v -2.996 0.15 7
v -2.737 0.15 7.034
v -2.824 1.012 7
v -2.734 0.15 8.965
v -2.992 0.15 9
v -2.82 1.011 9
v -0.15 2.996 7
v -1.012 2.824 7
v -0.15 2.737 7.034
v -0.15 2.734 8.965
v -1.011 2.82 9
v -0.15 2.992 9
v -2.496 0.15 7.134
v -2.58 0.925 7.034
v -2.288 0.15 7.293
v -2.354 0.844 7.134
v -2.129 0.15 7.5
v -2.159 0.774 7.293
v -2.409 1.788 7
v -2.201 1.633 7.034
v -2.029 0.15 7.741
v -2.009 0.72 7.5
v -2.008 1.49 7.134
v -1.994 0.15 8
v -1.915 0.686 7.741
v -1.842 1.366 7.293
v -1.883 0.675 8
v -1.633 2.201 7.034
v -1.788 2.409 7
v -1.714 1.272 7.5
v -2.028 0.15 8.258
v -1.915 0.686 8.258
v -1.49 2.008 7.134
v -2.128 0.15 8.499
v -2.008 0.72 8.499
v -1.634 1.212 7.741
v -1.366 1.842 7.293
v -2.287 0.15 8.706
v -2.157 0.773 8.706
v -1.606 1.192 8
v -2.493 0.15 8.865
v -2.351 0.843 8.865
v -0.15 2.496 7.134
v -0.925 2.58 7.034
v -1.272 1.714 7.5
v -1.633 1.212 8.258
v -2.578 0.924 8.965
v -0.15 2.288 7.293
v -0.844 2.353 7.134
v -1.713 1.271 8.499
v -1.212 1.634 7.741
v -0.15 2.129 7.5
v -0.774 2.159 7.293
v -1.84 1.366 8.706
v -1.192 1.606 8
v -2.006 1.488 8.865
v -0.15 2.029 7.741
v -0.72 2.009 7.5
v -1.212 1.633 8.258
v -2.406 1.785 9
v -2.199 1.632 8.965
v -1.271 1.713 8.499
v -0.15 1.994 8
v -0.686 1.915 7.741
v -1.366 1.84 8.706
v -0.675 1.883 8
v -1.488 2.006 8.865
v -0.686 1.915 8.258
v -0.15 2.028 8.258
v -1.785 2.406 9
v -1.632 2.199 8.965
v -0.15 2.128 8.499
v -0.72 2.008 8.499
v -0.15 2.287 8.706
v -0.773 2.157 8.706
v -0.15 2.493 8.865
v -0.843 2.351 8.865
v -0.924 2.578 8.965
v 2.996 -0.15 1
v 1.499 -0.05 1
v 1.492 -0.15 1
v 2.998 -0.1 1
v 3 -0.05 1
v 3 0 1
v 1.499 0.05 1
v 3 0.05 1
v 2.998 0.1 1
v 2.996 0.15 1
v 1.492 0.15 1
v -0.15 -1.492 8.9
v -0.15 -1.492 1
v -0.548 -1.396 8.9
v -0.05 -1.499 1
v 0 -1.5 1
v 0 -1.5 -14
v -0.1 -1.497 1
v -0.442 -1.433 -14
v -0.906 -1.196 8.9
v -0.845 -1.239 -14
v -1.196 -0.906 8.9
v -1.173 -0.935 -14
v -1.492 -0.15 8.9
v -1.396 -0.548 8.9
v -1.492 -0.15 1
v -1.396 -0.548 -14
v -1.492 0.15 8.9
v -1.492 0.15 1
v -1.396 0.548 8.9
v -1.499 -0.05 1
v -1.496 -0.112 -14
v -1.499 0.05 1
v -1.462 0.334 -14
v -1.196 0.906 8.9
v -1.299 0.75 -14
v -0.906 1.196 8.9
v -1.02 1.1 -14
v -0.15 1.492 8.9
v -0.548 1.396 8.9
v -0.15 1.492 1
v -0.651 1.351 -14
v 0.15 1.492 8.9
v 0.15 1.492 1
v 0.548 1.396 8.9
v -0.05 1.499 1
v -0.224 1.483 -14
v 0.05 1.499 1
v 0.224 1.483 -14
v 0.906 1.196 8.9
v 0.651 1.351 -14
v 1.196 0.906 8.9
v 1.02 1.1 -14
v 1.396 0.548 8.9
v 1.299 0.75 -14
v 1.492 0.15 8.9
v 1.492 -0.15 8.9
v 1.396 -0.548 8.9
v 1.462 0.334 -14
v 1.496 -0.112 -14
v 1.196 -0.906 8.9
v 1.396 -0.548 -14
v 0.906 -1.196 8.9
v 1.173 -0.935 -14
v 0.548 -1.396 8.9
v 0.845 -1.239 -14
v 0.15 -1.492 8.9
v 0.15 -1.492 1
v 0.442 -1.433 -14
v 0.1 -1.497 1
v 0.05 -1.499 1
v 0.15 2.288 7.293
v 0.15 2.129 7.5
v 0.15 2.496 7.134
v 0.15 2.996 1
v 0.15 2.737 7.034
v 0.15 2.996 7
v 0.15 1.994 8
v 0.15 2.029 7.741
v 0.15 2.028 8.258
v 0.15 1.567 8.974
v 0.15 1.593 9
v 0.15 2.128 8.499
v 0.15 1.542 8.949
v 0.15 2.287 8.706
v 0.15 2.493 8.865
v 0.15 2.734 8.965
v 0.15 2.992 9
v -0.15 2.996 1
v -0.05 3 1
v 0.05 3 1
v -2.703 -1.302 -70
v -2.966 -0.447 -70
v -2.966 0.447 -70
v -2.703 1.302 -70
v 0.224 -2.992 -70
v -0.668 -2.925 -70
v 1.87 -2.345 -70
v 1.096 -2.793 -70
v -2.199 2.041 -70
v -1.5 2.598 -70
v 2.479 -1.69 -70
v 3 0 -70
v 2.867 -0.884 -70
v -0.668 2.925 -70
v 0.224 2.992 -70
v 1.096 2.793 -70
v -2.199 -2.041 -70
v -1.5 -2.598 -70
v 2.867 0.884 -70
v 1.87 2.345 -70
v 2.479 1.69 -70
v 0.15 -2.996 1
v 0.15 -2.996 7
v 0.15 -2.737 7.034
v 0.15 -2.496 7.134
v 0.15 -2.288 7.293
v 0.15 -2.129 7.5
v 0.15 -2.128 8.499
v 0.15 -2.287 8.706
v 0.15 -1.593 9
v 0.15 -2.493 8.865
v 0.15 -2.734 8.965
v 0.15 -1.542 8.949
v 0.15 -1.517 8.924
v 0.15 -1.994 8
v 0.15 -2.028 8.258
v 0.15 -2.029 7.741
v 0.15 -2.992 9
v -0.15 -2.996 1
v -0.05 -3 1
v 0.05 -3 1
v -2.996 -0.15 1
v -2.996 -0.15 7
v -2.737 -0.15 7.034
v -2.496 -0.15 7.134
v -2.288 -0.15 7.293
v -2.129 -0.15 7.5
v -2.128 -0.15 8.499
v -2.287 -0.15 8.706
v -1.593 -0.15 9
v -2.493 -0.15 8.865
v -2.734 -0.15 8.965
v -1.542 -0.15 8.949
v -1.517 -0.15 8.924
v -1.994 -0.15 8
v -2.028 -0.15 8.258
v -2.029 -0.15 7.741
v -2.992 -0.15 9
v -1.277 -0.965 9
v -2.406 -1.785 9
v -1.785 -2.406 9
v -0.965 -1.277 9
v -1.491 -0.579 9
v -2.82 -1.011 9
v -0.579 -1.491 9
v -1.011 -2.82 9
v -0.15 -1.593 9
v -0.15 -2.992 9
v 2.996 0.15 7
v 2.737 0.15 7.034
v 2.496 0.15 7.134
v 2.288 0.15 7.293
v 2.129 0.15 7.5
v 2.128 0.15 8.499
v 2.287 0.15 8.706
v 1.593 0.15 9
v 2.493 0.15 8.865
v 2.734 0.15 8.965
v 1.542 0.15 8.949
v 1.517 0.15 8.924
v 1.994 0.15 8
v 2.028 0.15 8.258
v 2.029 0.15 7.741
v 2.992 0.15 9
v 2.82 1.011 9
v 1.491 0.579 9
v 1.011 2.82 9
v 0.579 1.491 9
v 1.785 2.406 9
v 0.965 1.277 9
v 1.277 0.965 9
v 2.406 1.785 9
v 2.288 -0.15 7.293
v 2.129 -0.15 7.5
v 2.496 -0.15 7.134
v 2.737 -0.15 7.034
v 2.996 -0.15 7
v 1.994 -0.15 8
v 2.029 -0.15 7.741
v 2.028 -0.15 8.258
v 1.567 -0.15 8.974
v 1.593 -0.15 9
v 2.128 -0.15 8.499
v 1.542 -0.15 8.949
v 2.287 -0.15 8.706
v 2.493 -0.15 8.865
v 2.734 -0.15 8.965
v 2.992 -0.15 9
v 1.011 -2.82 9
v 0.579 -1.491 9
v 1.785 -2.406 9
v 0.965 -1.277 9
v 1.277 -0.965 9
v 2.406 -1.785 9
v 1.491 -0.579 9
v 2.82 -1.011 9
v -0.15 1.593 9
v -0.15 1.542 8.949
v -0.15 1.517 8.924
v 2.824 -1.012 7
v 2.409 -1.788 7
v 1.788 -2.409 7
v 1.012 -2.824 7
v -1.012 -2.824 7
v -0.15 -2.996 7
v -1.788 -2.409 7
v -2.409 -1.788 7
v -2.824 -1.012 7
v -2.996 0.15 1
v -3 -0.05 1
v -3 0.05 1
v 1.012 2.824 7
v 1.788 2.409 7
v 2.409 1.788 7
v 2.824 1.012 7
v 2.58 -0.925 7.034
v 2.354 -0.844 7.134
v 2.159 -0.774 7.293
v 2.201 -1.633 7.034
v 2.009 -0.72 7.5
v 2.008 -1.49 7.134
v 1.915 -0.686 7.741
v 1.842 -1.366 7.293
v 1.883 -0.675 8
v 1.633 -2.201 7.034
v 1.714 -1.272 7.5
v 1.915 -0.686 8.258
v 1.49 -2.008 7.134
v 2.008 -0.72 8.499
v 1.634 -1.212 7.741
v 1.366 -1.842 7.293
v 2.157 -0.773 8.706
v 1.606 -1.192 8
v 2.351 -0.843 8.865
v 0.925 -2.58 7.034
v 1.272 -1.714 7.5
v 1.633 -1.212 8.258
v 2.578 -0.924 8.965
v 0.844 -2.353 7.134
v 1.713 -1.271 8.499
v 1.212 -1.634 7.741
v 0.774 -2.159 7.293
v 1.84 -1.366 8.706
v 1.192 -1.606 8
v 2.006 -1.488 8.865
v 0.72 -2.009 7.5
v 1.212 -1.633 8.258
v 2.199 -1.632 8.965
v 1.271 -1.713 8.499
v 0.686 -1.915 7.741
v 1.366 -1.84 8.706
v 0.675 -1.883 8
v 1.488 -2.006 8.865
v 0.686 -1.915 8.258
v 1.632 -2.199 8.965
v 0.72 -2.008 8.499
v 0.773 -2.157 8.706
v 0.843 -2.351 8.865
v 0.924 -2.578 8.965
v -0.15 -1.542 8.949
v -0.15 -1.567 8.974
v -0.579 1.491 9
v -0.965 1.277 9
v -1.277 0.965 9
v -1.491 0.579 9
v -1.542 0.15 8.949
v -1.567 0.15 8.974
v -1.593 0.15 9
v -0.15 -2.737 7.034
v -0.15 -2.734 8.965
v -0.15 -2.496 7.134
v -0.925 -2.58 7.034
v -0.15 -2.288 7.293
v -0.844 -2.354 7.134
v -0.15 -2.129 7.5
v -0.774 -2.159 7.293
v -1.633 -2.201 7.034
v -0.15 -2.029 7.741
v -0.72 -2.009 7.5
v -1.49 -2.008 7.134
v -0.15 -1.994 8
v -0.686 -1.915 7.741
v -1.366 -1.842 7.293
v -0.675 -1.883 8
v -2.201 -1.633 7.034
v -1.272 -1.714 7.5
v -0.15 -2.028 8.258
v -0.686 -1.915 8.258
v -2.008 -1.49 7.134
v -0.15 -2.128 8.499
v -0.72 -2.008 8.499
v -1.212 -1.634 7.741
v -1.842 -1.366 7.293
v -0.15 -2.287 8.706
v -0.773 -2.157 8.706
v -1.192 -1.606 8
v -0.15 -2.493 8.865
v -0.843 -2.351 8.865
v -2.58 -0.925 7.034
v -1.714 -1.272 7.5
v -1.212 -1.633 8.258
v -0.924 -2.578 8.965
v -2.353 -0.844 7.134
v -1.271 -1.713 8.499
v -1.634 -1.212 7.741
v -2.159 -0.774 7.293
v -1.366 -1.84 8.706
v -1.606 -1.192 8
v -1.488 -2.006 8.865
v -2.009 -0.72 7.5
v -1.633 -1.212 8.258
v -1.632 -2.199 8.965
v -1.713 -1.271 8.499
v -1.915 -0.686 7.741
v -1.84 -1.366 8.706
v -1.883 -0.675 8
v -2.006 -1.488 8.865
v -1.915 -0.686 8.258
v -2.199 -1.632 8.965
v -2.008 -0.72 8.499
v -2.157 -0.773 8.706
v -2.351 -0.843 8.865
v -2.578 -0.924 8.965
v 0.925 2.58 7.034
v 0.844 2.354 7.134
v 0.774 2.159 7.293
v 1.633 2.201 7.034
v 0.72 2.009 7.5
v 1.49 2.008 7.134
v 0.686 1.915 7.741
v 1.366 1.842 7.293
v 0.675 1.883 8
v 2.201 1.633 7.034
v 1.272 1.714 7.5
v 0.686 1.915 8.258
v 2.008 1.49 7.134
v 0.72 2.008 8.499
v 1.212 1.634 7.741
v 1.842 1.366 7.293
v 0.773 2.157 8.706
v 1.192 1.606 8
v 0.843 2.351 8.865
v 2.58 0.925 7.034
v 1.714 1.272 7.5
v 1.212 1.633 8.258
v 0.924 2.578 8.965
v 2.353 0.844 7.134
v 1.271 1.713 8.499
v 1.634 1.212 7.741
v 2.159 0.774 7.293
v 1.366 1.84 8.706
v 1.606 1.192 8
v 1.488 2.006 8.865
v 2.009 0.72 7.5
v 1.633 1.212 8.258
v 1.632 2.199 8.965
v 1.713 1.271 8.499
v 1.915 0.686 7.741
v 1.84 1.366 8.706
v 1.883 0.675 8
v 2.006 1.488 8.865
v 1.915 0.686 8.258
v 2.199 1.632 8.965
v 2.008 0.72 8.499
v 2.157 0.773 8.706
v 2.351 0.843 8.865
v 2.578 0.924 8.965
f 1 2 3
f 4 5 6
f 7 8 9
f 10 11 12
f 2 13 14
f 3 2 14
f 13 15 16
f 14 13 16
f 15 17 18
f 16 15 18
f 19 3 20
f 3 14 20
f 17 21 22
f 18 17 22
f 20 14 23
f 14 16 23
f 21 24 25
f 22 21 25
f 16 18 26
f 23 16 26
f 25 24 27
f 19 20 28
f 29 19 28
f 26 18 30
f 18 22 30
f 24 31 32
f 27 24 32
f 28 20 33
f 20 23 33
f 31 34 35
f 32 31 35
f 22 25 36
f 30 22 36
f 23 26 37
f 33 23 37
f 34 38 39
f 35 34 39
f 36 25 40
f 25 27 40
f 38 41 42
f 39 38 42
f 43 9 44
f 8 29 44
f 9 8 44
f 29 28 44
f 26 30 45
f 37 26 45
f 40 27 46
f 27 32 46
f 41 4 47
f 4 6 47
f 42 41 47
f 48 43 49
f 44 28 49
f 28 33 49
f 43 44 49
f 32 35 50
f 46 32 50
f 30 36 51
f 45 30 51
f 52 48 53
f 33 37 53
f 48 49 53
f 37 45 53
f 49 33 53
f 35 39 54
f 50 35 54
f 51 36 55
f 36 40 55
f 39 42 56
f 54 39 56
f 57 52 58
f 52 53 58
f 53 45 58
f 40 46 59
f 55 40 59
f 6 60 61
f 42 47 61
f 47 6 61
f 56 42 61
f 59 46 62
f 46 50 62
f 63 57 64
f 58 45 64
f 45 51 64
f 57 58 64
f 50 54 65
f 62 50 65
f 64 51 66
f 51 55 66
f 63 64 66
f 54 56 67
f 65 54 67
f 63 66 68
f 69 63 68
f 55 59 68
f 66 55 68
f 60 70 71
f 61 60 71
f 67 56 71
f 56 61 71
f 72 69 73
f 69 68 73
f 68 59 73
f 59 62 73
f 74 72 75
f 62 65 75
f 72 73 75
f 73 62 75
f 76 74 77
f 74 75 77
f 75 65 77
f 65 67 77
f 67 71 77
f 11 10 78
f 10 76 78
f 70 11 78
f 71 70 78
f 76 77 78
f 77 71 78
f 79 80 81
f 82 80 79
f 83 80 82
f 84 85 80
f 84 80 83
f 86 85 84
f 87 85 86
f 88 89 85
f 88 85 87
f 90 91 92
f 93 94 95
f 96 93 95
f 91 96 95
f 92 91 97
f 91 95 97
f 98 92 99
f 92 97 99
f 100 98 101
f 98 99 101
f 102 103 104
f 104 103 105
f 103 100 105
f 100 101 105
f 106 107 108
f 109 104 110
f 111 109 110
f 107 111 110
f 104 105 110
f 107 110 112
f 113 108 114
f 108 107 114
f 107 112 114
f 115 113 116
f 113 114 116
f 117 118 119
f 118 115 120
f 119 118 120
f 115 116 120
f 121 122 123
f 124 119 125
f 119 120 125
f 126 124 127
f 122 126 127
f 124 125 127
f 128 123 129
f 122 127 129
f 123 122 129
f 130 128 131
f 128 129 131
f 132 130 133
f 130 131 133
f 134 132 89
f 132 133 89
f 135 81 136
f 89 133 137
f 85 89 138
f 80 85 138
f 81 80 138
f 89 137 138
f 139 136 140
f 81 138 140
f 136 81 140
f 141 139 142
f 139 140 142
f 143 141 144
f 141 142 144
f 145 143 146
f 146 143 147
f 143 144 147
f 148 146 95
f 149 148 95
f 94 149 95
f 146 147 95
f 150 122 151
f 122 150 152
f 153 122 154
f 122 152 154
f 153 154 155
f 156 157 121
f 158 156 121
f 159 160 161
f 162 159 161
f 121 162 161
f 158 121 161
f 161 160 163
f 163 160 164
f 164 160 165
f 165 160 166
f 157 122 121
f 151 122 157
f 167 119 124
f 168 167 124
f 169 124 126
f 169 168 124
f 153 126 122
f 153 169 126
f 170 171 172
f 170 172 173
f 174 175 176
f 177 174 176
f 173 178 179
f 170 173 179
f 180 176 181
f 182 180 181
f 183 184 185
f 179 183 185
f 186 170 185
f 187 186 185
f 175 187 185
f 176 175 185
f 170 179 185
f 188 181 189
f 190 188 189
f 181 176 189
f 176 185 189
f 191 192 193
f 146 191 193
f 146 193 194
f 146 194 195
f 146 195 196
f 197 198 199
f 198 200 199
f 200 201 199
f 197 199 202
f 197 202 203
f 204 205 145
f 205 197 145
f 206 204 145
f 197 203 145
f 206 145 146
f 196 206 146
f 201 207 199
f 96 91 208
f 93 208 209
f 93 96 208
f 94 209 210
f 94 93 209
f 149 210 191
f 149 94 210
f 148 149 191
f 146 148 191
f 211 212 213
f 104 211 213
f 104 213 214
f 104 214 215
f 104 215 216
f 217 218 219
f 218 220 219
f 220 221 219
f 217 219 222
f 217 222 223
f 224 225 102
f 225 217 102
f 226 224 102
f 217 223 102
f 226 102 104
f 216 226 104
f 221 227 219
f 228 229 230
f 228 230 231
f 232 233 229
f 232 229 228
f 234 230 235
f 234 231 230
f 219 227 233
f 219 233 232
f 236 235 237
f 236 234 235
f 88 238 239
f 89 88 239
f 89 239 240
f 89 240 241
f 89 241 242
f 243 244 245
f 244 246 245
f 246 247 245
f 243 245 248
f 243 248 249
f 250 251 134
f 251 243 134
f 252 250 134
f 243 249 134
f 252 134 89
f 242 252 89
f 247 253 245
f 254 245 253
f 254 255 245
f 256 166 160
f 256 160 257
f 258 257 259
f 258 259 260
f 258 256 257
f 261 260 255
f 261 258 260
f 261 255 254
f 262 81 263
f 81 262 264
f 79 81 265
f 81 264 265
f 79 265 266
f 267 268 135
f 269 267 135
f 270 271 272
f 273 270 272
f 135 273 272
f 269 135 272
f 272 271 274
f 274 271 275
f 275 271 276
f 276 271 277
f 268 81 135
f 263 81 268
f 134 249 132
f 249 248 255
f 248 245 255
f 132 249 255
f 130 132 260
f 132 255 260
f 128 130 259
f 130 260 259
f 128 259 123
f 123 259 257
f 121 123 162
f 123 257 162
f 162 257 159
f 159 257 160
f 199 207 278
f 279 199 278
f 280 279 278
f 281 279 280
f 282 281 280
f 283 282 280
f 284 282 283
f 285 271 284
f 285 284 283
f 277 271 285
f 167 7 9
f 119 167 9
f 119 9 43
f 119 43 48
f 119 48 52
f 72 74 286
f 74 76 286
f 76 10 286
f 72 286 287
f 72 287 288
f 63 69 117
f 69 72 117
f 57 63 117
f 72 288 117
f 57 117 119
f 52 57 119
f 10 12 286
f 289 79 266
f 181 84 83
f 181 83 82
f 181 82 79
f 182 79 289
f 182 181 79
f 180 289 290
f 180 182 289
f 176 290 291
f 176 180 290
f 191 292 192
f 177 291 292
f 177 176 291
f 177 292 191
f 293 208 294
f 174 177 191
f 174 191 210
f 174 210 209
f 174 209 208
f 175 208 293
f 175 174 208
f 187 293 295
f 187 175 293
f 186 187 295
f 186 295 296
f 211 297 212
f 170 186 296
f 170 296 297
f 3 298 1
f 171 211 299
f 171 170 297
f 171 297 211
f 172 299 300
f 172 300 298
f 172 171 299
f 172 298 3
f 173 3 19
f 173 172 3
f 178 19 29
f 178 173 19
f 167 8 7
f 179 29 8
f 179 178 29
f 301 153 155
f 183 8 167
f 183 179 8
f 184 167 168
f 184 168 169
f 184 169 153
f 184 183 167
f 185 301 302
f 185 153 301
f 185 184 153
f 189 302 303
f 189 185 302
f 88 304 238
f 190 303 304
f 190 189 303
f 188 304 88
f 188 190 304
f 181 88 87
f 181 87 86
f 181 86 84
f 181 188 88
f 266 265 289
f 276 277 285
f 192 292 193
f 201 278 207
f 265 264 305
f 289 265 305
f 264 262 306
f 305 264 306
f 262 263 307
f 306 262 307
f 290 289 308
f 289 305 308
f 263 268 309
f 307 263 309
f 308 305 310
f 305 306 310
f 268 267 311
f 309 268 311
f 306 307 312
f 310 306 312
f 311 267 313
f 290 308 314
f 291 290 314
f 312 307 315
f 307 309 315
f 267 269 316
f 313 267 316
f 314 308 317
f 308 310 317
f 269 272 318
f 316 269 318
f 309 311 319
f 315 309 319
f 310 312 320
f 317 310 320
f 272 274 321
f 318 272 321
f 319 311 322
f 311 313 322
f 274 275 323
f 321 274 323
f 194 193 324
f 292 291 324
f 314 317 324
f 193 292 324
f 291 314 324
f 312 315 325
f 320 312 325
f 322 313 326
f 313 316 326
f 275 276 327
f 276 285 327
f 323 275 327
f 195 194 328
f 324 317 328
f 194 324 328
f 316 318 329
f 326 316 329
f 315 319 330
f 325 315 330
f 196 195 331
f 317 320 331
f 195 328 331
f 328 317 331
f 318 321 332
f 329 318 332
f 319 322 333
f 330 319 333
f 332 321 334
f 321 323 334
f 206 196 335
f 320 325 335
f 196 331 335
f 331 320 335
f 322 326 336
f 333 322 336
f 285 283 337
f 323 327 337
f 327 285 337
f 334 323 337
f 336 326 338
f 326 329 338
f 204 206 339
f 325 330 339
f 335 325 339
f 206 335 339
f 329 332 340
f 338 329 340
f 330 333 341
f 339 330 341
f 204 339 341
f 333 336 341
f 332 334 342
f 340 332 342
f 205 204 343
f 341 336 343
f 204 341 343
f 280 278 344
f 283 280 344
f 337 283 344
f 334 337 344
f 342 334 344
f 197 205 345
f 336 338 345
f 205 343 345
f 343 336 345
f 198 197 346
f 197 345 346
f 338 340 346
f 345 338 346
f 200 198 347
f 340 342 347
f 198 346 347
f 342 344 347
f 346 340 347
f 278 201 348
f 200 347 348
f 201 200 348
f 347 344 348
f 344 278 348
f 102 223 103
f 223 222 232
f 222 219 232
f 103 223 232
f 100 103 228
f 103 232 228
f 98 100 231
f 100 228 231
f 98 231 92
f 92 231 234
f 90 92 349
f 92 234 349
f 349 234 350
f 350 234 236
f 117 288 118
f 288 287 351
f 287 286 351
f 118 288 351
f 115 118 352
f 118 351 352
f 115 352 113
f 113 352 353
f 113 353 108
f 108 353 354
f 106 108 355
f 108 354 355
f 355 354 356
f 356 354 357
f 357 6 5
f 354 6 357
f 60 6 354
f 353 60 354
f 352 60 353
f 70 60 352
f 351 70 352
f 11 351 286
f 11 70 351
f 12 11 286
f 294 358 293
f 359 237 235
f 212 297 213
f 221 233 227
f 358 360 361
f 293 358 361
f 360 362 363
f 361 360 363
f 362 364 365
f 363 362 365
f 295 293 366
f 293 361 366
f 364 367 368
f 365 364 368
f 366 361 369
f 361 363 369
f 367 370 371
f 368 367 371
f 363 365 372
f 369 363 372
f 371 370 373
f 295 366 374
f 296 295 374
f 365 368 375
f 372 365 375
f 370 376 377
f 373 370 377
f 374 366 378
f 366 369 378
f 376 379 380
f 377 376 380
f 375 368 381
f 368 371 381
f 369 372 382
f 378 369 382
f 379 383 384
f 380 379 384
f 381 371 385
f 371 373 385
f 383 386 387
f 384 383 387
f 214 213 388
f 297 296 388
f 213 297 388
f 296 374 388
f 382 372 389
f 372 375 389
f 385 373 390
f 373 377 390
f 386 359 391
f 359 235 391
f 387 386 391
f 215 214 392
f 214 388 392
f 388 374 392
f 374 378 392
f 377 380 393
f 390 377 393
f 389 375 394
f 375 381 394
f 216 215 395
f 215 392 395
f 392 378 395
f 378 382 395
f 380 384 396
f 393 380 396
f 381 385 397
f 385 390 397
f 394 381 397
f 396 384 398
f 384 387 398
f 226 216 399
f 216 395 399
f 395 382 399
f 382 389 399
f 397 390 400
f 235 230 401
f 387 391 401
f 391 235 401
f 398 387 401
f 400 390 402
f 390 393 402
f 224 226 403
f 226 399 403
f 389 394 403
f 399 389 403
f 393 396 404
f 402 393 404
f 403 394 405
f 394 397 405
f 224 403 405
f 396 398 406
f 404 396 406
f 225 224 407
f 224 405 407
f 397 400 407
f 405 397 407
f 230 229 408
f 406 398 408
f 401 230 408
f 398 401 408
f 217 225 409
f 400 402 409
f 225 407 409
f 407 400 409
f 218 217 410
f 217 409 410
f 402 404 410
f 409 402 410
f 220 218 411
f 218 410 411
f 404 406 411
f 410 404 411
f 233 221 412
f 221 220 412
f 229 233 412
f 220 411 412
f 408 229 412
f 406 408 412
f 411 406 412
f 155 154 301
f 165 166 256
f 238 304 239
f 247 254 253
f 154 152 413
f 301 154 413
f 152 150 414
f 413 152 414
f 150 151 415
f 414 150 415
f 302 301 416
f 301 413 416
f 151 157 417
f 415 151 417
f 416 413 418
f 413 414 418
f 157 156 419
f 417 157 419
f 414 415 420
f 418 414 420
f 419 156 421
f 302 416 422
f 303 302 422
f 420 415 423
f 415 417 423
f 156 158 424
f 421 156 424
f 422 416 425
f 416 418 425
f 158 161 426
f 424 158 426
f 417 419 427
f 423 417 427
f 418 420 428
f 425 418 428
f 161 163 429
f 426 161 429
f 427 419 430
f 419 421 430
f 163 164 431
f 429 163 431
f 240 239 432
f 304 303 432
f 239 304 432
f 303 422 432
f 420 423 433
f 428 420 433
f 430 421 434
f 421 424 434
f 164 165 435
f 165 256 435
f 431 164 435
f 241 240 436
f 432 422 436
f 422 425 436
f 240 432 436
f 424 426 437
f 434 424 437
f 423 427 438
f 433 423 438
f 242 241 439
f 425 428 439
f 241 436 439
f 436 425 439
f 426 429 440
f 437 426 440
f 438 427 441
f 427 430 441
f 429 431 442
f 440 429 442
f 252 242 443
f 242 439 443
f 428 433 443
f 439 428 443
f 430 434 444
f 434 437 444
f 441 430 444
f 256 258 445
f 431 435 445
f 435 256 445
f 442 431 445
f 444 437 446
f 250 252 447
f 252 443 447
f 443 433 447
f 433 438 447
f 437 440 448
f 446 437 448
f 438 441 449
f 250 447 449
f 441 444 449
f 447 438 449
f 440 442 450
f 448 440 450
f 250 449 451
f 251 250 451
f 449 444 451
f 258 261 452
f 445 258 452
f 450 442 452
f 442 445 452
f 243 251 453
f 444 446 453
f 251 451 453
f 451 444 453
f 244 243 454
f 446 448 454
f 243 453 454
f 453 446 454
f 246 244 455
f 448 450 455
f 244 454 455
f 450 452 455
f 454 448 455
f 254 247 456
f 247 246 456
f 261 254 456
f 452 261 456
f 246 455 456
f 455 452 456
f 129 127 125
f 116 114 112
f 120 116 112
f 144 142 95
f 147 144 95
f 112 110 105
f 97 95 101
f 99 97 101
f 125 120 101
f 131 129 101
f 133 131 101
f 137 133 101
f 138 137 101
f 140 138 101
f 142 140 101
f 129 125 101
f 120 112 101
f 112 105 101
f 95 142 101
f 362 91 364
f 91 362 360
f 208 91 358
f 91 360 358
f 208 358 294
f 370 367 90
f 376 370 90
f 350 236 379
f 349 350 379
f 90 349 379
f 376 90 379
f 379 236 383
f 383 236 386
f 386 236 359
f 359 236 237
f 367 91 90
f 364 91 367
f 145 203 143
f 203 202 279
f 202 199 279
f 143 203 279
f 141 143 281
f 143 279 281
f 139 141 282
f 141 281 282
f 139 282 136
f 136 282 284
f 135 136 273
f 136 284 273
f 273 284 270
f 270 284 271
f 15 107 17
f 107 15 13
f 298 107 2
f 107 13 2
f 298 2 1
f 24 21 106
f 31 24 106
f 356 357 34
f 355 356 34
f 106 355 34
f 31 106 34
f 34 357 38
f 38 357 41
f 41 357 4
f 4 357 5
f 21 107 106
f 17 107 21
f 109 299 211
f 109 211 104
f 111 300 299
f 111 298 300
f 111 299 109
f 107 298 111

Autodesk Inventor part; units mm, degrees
ref_plane "YZ Plane" through (0, 0, 0) normal (1, 0, 0) x (0, 1, 0)
ref_plane "XZ Plane" through (0, 0, 0) normal (0, 1, 0) x (-1, 0, 0)
sketch "Skizze1" plane through (0, 0, 0) normal (0, 0, 1) x (1, 0, 0)
  circle A0 centre (0, 0) radius 3
  dimension "d2" = 6
extrude "Extrusion1" add sketch "Skizze1" against normal blind 70
sketch "Skizze2" plane through (0, 0, 0) normal (0, 0, 1) x (1, 0, 0)
  circle A0 centre (0, 0) radius 3 projected
  circle A1 centre (0, 0) radius 3
  dimension "d36" = 6
extrude "Extrusion2" add sketch "Skizze2" along normal blind 1
sketch "Skizze3" plane through (0, 0, 1) normal (0, 0, 1) x (1, 0, 0)
  circle A0 centre (0, 0) radius 3 projected
  circle A1 centre (0, 0) radius 3
  dimension "d28" = 6
extrude "Extrusion3" add sketch "Skizze3" along normal blind 8
ref_plane "Arbeitsebene1" through (0, 0, 2.5) normal (0, 0, 1) x (1, 0, 0)
sketch "Skizze4" plane through (0, 0, 2.5) normal (0, 0, 1) x (1, 0, 0)
  circle A0 centre (0, 0) radius 3
extrude "Extrusion4" [suppressed]
hole "Bohrung1" at (0, 0, 9) direction (0, 0, -1) diameter 3 depth 23
chamfer "Fase1" distance 0.1 angle 45 1 edges at (0, 1.5, 9)
sketch "Skizze5" plane through (0, 0, 9) normal (0, 0, 1) x (1, 0, 0)
  circle A0 centre (0, 0) radius 3 projected
  line L0 (-3.5, -0.15) -> (3.5, -0.15)
  line L1 (3.5, -0.15) -> (3.5, 0.15)
  line L2 (3.5, 0.15) -> (-3.5, 0.15)
  line L3 (-3.5, 0.15) -> (-3.5, -0.15)
  line L4 (-3.5, -0.15) -> (3.5, 0.15) construction
  line L5 (3.5, -0.15) -> (-3.5, 0.15) construction
  line L6 (-0.15, -3.5) -> (0.15, -3.5)
  line L7 (0.15, -3.5) -> (0.15, 3.5)
  line L8 (0.15, 3.5) -> (-0.15, 3.5)
  line L9 (-0.15, 3.5) -> (-0.15, -3.5)
  line L10 (-0.15, -3.5) -> (0.15, 3.5) construction
  line L11 (0.15, -3.5) -> (-0.15, 3.5) construction
extrude "Extrusion5" cut sketch "Skizze5" against normal up to surface (8 mm away) contours A0 L0 L7 L2 | A0 L2 L1 L0 | L7 L2 L9 A0 | A0 L9 L8 L7 | L7 L0 L9 L2 | L7 L6 L9 A0 | A0 L9 L0 L7 | L9 L0 A0 L2 | A0 L0 L3 L2
sketch "Skizze6" plane through (0, 0, 0) normal (0, 1, 0) x (-1, 0, 0)
  line L0 (0, 0) -> (-2, 0)
  line L1 (0, -1.8) -> (0, 10.8) projected
  circle A0 centre (-3, 8) radius 1
  line L2 (-0.15, 9) -> (-2.9962, 9) projected
  dimension "d33" = 3
  dimension "d34" = 2
  dimension "d35" = 1
revolve "Umdrehung1" cut sketch "Skizze6" angle 360 about axis through (0, 0, -10) along (0, 0, 1)
equation "\"d2\" = LowerDiameter"
equation "\"d0\" = LowerLength"
equation "\"d36\" = SealingRingDiameter"
equation "\"d3\" = SealingRingThickness"
equation "\"d28\" = UpperDiameter"
equation "\"d5\" = UpperLength"
equation "\"d9\" = DrillDiameter"
equation "\"d14\" = DrillDepth"
equation "\"UpperDiameter\" = 6"
equation "\"LowerDiameter\" = 6"
equation "\"UpperLength\" = 8"
equation "\"LowerLength\" = 70"
equation "\"SealingRingDiameter\" = 6"
equation "\"SealingRingThickness\" = 1"
equation "\"DrillDiameter\" = 3"
equation "\"DrillDepth\" = 23"
properties part number "specimen_holder_rod_6mm" material "Edelstahl"
